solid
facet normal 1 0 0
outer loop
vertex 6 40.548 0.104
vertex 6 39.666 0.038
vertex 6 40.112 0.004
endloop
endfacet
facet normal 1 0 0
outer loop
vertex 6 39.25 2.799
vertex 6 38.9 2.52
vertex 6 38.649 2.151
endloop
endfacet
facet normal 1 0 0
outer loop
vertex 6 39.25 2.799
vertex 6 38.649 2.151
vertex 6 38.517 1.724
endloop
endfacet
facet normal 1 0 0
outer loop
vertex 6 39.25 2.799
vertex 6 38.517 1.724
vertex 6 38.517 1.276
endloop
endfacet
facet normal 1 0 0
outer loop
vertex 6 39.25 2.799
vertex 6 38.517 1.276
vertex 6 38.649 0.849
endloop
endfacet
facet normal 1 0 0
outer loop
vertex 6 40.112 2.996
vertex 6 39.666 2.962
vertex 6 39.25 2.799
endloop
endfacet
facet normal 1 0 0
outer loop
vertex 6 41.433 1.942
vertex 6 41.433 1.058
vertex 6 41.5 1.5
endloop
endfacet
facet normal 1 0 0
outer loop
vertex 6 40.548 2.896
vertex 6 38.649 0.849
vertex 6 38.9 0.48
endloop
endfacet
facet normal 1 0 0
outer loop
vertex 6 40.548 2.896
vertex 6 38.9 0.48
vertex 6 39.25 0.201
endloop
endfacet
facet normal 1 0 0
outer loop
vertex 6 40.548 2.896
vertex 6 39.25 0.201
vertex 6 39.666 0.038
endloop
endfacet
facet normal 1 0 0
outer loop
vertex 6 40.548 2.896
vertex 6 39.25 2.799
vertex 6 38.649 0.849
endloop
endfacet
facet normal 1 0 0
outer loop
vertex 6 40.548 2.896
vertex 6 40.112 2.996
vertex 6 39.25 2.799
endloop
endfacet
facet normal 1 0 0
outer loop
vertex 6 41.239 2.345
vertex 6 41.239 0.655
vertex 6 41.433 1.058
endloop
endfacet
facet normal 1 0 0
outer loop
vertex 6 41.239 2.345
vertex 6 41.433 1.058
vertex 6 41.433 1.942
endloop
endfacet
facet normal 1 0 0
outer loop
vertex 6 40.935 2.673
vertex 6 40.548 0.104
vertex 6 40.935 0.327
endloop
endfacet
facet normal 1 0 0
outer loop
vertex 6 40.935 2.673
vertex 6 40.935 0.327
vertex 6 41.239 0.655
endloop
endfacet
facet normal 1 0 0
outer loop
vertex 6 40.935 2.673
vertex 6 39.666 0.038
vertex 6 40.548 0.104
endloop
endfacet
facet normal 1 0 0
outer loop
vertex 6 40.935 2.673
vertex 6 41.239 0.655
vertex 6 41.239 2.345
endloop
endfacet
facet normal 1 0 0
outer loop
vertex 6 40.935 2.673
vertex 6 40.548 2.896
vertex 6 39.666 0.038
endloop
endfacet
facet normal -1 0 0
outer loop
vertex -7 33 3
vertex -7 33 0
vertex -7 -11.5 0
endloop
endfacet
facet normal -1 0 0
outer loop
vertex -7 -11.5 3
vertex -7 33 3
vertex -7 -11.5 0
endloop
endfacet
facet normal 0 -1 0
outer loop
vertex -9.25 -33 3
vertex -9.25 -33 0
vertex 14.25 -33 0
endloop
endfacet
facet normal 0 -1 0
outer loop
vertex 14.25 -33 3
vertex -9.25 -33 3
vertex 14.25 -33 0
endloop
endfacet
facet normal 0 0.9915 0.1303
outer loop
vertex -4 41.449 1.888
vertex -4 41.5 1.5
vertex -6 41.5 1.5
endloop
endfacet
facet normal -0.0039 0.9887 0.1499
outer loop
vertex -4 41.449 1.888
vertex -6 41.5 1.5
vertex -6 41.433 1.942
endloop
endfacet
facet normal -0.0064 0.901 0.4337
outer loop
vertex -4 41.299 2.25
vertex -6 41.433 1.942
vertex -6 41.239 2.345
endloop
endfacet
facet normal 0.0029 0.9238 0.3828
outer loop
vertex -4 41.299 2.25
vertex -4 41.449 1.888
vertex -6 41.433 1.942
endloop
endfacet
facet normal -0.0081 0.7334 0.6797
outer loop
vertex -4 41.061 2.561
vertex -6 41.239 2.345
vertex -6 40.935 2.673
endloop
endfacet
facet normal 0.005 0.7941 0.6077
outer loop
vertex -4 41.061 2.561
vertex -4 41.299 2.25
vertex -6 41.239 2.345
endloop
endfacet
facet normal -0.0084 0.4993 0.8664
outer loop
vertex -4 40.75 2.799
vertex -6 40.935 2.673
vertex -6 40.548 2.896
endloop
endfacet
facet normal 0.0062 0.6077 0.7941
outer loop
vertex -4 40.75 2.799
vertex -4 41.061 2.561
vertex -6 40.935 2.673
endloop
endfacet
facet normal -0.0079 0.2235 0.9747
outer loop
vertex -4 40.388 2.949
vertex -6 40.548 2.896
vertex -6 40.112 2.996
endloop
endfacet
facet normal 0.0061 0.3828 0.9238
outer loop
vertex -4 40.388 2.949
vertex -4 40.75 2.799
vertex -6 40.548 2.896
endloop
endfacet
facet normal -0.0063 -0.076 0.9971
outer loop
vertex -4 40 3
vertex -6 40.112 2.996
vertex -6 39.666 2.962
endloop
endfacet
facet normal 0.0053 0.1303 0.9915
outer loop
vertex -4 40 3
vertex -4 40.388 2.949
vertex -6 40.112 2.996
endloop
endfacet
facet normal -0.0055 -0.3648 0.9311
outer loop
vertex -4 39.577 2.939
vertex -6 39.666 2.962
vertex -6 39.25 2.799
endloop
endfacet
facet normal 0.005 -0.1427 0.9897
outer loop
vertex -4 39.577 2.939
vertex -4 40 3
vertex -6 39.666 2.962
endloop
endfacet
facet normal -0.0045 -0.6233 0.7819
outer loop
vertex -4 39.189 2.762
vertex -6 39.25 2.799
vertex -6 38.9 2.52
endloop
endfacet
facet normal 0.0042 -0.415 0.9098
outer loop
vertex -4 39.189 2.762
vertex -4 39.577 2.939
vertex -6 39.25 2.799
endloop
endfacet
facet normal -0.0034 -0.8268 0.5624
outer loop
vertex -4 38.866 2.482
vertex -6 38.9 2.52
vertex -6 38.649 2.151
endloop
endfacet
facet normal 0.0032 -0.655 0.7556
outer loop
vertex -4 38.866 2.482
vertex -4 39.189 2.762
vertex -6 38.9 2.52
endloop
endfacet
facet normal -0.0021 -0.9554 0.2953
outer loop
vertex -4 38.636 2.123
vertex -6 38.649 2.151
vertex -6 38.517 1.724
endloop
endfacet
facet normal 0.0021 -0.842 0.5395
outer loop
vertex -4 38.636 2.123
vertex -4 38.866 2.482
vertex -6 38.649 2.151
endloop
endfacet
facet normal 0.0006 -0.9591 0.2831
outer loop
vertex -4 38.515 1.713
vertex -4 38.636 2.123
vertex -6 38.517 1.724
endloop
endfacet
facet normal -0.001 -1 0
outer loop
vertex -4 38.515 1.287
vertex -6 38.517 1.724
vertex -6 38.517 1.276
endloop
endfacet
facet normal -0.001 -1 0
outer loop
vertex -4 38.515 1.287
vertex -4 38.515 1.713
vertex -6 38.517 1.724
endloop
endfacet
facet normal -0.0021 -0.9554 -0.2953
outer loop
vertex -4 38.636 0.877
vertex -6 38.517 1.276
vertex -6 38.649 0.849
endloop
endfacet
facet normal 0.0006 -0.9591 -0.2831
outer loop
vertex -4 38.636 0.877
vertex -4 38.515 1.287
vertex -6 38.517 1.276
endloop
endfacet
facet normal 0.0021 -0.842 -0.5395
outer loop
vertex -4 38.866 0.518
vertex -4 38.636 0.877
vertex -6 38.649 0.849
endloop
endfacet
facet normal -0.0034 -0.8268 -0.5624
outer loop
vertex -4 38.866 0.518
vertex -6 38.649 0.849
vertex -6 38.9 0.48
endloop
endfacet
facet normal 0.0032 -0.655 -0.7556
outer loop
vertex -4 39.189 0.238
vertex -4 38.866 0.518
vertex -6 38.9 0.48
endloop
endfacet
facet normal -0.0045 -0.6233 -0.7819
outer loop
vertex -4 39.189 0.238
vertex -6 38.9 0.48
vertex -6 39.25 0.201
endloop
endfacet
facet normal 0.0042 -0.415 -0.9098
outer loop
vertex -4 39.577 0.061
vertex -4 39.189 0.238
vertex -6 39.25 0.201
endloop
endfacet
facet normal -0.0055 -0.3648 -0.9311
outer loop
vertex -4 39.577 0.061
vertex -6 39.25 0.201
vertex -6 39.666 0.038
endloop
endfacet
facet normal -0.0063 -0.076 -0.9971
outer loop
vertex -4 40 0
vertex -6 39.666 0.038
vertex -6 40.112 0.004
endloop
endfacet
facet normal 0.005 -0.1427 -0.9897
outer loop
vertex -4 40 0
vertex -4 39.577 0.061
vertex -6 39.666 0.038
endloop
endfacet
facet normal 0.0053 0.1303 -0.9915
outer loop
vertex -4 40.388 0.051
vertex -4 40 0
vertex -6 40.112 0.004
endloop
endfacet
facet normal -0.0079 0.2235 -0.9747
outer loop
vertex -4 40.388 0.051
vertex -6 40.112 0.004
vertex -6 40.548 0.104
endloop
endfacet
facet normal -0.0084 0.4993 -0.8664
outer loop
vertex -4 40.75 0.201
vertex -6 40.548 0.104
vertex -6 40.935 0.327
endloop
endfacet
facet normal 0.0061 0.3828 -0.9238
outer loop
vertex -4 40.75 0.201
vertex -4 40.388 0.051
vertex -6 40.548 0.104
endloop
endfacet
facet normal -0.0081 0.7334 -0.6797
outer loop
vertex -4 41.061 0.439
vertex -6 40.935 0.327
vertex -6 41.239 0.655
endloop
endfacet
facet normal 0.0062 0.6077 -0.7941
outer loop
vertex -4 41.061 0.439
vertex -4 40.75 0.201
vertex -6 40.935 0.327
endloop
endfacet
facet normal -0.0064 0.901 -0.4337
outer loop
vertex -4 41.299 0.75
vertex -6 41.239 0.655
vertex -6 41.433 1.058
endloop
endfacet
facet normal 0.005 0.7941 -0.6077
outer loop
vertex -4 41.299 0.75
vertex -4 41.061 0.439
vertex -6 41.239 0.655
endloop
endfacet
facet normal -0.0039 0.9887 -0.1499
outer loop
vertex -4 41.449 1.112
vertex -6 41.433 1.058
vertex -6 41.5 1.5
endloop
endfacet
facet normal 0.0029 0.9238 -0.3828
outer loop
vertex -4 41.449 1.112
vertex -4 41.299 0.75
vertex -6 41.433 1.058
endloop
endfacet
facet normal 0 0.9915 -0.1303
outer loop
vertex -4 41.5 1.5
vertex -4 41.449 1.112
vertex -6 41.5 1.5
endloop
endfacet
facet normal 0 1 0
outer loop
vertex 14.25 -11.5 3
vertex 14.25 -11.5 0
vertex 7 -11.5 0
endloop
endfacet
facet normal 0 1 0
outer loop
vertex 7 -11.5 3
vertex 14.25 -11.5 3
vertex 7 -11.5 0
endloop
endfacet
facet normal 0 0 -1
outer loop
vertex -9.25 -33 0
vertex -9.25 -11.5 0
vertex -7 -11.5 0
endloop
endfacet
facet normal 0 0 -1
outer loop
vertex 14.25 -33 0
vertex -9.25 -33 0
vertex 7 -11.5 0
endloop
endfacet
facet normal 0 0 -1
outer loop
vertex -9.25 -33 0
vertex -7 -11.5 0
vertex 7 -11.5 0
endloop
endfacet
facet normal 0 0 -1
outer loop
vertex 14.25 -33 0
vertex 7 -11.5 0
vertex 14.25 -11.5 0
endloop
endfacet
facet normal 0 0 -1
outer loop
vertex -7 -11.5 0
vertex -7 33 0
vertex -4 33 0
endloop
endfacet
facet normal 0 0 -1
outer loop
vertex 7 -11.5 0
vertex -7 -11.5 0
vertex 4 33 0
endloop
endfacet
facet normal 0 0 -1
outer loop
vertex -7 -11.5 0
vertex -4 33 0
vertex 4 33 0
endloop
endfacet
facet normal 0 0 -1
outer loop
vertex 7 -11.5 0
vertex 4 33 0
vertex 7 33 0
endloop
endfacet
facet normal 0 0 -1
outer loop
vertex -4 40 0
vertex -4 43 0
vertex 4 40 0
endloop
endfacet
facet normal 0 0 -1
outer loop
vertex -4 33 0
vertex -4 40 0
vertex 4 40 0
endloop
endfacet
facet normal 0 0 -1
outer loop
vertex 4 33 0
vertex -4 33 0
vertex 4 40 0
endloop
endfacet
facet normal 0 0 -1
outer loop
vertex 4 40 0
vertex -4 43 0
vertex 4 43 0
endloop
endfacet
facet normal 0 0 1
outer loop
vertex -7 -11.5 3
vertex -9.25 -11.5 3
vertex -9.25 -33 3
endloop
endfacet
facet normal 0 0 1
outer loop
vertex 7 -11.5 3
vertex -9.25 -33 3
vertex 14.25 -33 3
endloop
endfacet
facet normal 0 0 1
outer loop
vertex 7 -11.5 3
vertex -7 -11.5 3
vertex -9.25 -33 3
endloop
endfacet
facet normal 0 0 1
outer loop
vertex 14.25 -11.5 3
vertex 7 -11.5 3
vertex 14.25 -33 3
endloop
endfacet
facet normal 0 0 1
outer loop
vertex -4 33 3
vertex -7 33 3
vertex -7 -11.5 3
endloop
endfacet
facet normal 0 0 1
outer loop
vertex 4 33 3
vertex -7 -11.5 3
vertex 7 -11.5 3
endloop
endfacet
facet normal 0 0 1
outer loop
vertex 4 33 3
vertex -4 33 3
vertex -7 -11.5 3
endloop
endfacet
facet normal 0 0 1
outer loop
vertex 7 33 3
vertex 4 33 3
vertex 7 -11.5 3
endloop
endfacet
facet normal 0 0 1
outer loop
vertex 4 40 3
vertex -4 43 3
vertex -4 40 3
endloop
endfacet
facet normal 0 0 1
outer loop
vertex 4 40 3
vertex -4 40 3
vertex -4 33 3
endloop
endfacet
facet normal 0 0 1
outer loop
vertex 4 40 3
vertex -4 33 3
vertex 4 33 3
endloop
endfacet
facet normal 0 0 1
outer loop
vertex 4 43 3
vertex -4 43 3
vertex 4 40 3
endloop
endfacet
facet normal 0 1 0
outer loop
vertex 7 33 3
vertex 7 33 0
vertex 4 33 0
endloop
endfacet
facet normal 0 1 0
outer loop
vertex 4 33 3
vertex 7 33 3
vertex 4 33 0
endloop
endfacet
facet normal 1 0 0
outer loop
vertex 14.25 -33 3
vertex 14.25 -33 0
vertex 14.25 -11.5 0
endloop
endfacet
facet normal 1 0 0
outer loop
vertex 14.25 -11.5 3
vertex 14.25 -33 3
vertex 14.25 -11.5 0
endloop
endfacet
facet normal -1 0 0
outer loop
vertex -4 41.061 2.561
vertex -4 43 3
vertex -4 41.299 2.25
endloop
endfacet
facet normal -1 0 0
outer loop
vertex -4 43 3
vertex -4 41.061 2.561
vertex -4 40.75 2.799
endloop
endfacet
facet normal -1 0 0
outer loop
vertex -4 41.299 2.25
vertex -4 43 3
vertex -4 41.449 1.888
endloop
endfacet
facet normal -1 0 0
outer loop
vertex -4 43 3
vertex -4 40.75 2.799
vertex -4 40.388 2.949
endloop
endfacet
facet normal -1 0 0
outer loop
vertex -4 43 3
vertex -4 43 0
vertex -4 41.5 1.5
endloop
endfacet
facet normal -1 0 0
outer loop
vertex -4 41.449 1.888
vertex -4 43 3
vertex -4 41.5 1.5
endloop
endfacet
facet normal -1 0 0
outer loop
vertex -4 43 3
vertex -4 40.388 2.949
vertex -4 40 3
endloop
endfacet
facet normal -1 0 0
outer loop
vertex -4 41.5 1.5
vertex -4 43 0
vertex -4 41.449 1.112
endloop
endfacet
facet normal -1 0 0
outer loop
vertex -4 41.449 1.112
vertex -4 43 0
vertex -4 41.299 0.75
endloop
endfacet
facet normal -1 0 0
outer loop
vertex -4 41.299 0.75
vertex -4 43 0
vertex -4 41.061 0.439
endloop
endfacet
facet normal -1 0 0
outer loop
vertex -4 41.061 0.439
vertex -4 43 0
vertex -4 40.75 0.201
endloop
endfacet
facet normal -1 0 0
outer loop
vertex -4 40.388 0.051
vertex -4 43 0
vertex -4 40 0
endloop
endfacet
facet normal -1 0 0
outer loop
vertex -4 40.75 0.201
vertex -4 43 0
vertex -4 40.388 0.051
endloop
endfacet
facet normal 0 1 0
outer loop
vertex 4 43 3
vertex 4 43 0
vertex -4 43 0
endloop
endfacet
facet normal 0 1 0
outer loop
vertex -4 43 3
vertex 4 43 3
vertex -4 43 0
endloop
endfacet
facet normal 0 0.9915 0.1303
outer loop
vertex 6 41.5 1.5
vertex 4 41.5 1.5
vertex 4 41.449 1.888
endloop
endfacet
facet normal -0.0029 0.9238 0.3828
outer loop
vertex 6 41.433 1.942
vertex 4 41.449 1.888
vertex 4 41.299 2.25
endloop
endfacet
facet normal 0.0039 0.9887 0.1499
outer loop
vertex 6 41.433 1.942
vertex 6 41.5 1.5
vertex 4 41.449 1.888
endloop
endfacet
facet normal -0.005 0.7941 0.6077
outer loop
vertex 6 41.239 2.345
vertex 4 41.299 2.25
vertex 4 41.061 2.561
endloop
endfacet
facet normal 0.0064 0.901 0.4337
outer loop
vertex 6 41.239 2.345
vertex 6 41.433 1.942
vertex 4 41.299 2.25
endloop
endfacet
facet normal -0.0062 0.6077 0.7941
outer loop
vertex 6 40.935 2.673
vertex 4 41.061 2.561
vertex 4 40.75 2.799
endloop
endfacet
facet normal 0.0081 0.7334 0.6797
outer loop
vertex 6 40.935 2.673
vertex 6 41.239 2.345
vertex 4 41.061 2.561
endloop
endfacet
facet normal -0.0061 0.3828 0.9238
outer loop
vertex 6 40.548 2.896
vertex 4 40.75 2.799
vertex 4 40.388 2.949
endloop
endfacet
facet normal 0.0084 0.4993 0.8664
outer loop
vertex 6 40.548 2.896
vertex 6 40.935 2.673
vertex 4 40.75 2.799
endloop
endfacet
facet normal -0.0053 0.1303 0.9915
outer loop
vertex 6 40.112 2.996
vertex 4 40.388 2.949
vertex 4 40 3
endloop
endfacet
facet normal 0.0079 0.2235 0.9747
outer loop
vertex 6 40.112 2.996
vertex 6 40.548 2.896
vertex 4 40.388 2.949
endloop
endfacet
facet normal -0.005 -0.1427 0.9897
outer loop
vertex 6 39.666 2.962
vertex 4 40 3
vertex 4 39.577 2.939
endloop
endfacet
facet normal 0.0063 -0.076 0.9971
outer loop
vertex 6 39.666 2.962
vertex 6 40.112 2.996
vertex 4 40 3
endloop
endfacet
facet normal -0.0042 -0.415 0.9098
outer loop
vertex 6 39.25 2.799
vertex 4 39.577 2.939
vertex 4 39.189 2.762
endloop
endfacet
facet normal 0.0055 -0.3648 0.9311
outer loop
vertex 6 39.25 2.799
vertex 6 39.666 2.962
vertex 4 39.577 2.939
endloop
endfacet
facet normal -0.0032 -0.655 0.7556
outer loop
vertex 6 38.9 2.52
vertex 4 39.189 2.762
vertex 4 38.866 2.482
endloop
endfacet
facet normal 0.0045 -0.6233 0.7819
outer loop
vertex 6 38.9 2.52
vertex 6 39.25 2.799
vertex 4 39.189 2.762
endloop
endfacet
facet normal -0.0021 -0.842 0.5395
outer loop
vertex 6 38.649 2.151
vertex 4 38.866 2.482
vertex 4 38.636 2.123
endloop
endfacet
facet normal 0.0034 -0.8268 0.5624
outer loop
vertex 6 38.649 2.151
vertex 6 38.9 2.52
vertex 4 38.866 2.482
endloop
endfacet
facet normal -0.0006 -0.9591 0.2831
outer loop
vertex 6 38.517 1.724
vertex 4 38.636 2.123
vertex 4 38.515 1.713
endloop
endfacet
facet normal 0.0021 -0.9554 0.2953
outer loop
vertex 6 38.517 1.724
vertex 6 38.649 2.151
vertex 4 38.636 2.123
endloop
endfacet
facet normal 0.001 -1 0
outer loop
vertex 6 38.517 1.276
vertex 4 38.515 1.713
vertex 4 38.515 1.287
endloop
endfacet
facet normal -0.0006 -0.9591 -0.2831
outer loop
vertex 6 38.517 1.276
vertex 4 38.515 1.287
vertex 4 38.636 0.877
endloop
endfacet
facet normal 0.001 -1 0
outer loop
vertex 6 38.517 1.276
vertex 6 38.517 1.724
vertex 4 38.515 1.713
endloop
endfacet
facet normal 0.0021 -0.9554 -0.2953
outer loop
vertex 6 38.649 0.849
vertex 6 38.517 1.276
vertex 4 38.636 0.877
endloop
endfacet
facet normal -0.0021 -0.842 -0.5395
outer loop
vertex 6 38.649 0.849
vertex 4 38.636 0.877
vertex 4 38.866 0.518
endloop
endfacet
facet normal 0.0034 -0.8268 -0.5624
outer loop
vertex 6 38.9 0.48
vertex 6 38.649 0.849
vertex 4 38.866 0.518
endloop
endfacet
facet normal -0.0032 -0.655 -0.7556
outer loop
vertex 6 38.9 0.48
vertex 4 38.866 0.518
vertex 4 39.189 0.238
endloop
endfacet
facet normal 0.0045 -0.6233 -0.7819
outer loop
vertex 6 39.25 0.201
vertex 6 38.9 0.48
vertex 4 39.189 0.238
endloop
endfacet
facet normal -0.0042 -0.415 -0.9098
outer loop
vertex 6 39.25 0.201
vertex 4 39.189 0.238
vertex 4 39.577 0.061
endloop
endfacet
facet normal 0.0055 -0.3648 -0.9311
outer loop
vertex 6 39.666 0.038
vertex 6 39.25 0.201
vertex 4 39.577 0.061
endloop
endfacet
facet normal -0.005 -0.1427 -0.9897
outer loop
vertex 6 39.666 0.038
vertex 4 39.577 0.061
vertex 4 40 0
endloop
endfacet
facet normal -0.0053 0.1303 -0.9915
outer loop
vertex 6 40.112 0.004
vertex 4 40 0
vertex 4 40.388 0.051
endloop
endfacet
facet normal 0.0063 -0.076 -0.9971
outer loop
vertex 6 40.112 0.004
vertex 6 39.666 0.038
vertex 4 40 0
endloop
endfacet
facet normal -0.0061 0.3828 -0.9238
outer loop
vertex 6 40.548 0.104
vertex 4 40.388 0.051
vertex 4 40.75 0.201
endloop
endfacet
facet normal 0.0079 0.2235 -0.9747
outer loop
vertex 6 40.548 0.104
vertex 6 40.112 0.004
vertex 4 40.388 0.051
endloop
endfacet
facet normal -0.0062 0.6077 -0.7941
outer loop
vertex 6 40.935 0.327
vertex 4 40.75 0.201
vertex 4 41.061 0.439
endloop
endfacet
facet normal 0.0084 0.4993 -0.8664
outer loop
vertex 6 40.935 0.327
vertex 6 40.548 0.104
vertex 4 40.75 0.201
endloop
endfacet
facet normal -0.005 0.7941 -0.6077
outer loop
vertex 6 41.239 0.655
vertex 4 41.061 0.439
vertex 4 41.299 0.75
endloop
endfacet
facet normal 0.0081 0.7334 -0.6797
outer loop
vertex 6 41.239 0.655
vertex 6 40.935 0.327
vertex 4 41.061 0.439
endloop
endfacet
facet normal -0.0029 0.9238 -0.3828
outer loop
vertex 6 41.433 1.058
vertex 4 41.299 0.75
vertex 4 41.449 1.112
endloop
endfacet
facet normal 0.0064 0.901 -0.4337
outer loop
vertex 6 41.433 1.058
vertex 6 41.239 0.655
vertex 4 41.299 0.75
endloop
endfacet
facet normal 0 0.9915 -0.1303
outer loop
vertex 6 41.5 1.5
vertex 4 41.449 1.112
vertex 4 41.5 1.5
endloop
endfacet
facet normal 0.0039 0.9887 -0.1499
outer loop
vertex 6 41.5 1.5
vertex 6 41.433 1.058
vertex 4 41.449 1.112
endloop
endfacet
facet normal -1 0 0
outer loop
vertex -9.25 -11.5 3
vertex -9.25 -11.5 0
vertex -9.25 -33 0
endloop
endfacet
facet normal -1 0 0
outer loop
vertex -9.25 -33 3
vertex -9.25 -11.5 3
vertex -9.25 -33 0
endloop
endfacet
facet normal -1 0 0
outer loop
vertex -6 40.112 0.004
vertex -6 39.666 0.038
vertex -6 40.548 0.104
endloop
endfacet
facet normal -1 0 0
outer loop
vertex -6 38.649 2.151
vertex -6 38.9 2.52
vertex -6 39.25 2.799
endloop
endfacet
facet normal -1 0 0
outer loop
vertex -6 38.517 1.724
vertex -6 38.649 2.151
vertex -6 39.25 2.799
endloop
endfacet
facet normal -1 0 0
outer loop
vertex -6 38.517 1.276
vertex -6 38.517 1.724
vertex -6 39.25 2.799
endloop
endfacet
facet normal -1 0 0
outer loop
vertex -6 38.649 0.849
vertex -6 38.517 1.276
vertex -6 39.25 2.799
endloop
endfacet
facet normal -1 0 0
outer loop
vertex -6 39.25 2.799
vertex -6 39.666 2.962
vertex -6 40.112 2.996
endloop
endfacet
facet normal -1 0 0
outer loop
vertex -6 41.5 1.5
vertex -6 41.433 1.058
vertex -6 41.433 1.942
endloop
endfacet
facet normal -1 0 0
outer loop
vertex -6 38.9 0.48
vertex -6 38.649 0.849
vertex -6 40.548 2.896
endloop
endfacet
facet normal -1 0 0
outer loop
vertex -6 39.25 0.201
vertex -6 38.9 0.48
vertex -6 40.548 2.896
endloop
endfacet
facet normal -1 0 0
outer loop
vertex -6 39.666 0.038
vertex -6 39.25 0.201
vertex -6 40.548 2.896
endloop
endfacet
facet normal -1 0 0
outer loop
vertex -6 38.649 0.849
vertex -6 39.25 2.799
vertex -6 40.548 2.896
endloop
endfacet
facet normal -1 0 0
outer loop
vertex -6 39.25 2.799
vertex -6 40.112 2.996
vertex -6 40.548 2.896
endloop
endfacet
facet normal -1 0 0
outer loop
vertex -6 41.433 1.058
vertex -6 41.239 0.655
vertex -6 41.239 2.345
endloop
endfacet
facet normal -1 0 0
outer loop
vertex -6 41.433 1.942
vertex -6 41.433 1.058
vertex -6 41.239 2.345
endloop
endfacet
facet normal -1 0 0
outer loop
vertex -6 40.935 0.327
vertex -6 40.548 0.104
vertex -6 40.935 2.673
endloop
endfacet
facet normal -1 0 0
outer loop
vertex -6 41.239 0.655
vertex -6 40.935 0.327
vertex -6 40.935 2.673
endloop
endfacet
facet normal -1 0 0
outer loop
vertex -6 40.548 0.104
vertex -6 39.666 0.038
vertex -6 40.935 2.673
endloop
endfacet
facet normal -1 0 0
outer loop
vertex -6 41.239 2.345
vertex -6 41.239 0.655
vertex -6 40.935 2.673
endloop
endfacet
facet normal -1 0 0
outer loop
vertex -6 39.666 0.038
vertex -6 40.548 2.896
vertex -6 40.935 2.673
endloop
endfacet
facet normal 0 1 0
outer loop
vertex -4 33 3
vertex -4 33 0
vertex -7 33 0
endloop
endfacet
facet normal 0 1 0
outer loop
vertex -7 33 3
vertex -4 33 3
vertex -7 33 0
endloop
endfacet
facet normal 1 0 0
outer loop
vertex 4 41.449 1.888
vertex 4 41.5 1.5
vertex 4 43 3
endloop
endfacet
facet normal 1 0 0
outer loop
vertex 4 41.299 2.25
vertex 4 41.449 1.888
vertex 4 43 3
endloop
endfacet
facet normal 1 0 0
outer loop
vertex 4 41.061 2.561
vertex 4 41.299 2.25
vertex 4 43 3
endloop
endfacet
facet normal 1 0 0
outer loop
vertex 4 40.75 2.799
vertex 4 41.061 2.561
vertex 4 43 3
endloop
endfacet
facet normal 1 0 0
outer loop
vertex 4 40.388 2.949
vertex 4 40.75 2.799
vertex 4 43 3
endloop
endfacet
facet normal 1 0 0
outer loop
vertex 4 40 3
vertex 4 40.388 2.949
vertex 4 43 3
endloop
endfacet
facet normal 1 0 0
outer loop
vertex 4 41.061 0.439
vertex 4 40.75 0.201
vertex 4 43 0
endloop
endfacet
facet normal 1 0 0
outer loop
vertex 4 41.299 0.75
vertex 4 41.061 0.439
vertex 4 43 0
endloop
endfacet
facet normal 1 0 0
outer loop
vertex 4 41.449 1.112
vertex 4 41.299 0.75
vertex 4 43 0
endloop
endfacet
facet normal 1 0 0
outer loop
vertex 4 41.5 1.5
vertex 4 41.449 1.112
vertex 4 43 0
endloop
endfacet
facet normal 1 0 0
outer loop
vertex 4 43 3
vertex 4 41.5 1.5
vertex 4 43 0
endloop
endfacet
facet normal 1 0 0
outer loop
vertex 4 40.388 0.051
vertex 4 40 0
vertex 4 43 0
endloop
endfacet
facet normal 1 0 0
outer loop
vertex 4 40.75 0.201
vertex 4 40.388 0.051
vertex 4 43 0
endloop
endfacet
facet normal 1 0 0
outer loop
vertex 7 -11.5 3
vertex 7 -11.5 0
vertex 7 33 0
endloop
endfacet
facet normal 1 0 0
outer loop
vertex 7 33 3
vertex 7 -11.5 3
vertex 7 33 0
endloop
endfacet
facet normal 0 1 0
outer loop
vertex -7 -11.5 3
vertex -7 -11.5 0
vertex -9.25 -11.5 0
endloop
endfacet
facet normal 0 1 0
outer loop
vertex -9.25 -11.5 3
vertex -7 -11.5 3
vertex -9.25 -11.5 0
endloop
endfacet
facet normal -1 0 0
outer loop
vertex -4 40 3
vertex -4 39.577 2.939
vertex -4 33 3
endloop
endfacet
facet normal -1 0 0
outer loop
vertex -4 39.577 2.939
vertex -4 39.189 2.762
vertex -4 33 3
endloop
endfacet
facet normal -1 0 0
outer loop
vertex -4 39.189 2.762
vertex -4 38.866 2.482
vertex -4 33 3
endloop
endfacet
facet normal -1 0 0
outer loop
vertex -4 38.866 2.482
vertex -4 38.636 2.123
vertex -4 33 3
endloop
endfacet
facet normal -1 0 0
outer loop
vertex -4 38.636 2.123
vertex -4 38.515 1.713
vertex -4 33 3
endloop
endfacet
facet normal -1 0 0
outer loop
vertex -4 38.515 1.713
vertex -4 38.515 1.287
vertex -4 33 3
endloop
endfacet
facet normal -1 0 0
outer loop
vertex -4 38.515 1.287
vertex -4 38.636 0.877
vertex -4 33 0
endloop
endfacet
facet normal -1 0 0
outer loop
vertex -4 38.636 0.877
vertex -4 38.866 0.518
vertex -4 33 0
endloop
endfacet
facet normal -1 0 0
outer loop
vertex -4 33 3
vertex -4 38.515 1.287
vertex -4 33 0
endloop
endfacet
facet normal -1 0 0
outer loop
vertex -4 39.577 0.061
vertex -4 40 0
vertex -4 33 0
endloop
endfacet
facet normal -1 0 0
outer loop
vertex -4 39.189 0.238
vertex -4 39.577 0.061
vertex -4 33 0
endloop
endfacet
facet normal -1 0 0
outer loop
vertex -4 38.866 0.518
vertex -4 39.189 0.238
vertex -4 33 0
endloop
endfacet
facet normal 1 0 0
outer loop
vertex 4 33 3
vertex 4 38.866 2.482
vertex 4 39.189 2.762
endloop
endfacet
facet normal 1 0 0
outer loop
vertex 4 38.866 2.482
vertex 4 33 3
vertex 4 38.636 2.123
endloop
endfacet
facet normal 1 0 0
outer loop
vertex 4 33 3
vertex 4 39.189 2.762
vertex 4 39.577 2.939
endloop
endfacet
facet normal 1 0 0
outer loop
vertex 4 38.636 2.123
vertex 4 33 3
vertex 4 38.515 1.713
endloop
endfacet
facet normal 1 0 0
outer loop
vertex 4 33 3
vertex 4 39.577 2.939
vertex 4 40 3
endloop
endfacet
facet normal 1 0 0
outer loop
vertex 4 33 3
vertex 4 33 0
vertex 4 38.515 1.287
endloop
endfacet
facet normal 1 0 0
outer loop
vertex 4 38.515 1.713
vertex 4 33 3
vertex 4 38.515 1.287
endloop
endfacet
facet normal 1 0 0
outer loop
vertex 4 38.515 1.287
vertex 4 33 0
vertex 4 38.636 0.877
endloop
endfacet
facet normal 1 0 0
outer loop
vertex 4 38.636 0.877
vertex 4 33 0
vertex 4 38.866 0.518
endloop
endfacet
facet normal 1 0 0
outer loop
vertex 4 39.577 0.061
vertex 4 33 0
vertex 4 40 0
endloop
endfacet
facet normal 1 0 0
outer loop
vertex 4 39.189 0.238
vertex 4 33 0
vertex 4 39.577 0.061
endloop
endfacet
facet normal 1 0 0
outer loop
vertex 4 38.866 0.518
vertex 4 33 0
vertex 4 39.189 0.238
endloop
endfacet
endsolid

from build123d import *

# Parameters (mm, degrees)
PAD_DEPTH    = 3
SKETCH001_R  = 1.5
PAD001_DEPTH = 6


with BuildPart() as part:
    # Sketch → Pad (new body)
    with BuildSketch(Plane.XY):
        Polygon((-9.25, -33), (14.25, -33), (14.25, -11.5), (7, -11.5), (7, 33), (4, 33), (4, 43), (-4, 43), (-4, 33), (-7, 33), (-7, -11.5), (-9.25, -11.5), align=None)
    extrude(amount=PAD_DEPTH)

    # Sketch001 → Pad001 (join, symmetric)
    with BuildSketch(Plane.YZ):
        with Locations((40, 1.5)):
            Circle(SKETCH001_R)
    extrude(amount=PAD001_DEPTH, both=True)


solid = part.part
